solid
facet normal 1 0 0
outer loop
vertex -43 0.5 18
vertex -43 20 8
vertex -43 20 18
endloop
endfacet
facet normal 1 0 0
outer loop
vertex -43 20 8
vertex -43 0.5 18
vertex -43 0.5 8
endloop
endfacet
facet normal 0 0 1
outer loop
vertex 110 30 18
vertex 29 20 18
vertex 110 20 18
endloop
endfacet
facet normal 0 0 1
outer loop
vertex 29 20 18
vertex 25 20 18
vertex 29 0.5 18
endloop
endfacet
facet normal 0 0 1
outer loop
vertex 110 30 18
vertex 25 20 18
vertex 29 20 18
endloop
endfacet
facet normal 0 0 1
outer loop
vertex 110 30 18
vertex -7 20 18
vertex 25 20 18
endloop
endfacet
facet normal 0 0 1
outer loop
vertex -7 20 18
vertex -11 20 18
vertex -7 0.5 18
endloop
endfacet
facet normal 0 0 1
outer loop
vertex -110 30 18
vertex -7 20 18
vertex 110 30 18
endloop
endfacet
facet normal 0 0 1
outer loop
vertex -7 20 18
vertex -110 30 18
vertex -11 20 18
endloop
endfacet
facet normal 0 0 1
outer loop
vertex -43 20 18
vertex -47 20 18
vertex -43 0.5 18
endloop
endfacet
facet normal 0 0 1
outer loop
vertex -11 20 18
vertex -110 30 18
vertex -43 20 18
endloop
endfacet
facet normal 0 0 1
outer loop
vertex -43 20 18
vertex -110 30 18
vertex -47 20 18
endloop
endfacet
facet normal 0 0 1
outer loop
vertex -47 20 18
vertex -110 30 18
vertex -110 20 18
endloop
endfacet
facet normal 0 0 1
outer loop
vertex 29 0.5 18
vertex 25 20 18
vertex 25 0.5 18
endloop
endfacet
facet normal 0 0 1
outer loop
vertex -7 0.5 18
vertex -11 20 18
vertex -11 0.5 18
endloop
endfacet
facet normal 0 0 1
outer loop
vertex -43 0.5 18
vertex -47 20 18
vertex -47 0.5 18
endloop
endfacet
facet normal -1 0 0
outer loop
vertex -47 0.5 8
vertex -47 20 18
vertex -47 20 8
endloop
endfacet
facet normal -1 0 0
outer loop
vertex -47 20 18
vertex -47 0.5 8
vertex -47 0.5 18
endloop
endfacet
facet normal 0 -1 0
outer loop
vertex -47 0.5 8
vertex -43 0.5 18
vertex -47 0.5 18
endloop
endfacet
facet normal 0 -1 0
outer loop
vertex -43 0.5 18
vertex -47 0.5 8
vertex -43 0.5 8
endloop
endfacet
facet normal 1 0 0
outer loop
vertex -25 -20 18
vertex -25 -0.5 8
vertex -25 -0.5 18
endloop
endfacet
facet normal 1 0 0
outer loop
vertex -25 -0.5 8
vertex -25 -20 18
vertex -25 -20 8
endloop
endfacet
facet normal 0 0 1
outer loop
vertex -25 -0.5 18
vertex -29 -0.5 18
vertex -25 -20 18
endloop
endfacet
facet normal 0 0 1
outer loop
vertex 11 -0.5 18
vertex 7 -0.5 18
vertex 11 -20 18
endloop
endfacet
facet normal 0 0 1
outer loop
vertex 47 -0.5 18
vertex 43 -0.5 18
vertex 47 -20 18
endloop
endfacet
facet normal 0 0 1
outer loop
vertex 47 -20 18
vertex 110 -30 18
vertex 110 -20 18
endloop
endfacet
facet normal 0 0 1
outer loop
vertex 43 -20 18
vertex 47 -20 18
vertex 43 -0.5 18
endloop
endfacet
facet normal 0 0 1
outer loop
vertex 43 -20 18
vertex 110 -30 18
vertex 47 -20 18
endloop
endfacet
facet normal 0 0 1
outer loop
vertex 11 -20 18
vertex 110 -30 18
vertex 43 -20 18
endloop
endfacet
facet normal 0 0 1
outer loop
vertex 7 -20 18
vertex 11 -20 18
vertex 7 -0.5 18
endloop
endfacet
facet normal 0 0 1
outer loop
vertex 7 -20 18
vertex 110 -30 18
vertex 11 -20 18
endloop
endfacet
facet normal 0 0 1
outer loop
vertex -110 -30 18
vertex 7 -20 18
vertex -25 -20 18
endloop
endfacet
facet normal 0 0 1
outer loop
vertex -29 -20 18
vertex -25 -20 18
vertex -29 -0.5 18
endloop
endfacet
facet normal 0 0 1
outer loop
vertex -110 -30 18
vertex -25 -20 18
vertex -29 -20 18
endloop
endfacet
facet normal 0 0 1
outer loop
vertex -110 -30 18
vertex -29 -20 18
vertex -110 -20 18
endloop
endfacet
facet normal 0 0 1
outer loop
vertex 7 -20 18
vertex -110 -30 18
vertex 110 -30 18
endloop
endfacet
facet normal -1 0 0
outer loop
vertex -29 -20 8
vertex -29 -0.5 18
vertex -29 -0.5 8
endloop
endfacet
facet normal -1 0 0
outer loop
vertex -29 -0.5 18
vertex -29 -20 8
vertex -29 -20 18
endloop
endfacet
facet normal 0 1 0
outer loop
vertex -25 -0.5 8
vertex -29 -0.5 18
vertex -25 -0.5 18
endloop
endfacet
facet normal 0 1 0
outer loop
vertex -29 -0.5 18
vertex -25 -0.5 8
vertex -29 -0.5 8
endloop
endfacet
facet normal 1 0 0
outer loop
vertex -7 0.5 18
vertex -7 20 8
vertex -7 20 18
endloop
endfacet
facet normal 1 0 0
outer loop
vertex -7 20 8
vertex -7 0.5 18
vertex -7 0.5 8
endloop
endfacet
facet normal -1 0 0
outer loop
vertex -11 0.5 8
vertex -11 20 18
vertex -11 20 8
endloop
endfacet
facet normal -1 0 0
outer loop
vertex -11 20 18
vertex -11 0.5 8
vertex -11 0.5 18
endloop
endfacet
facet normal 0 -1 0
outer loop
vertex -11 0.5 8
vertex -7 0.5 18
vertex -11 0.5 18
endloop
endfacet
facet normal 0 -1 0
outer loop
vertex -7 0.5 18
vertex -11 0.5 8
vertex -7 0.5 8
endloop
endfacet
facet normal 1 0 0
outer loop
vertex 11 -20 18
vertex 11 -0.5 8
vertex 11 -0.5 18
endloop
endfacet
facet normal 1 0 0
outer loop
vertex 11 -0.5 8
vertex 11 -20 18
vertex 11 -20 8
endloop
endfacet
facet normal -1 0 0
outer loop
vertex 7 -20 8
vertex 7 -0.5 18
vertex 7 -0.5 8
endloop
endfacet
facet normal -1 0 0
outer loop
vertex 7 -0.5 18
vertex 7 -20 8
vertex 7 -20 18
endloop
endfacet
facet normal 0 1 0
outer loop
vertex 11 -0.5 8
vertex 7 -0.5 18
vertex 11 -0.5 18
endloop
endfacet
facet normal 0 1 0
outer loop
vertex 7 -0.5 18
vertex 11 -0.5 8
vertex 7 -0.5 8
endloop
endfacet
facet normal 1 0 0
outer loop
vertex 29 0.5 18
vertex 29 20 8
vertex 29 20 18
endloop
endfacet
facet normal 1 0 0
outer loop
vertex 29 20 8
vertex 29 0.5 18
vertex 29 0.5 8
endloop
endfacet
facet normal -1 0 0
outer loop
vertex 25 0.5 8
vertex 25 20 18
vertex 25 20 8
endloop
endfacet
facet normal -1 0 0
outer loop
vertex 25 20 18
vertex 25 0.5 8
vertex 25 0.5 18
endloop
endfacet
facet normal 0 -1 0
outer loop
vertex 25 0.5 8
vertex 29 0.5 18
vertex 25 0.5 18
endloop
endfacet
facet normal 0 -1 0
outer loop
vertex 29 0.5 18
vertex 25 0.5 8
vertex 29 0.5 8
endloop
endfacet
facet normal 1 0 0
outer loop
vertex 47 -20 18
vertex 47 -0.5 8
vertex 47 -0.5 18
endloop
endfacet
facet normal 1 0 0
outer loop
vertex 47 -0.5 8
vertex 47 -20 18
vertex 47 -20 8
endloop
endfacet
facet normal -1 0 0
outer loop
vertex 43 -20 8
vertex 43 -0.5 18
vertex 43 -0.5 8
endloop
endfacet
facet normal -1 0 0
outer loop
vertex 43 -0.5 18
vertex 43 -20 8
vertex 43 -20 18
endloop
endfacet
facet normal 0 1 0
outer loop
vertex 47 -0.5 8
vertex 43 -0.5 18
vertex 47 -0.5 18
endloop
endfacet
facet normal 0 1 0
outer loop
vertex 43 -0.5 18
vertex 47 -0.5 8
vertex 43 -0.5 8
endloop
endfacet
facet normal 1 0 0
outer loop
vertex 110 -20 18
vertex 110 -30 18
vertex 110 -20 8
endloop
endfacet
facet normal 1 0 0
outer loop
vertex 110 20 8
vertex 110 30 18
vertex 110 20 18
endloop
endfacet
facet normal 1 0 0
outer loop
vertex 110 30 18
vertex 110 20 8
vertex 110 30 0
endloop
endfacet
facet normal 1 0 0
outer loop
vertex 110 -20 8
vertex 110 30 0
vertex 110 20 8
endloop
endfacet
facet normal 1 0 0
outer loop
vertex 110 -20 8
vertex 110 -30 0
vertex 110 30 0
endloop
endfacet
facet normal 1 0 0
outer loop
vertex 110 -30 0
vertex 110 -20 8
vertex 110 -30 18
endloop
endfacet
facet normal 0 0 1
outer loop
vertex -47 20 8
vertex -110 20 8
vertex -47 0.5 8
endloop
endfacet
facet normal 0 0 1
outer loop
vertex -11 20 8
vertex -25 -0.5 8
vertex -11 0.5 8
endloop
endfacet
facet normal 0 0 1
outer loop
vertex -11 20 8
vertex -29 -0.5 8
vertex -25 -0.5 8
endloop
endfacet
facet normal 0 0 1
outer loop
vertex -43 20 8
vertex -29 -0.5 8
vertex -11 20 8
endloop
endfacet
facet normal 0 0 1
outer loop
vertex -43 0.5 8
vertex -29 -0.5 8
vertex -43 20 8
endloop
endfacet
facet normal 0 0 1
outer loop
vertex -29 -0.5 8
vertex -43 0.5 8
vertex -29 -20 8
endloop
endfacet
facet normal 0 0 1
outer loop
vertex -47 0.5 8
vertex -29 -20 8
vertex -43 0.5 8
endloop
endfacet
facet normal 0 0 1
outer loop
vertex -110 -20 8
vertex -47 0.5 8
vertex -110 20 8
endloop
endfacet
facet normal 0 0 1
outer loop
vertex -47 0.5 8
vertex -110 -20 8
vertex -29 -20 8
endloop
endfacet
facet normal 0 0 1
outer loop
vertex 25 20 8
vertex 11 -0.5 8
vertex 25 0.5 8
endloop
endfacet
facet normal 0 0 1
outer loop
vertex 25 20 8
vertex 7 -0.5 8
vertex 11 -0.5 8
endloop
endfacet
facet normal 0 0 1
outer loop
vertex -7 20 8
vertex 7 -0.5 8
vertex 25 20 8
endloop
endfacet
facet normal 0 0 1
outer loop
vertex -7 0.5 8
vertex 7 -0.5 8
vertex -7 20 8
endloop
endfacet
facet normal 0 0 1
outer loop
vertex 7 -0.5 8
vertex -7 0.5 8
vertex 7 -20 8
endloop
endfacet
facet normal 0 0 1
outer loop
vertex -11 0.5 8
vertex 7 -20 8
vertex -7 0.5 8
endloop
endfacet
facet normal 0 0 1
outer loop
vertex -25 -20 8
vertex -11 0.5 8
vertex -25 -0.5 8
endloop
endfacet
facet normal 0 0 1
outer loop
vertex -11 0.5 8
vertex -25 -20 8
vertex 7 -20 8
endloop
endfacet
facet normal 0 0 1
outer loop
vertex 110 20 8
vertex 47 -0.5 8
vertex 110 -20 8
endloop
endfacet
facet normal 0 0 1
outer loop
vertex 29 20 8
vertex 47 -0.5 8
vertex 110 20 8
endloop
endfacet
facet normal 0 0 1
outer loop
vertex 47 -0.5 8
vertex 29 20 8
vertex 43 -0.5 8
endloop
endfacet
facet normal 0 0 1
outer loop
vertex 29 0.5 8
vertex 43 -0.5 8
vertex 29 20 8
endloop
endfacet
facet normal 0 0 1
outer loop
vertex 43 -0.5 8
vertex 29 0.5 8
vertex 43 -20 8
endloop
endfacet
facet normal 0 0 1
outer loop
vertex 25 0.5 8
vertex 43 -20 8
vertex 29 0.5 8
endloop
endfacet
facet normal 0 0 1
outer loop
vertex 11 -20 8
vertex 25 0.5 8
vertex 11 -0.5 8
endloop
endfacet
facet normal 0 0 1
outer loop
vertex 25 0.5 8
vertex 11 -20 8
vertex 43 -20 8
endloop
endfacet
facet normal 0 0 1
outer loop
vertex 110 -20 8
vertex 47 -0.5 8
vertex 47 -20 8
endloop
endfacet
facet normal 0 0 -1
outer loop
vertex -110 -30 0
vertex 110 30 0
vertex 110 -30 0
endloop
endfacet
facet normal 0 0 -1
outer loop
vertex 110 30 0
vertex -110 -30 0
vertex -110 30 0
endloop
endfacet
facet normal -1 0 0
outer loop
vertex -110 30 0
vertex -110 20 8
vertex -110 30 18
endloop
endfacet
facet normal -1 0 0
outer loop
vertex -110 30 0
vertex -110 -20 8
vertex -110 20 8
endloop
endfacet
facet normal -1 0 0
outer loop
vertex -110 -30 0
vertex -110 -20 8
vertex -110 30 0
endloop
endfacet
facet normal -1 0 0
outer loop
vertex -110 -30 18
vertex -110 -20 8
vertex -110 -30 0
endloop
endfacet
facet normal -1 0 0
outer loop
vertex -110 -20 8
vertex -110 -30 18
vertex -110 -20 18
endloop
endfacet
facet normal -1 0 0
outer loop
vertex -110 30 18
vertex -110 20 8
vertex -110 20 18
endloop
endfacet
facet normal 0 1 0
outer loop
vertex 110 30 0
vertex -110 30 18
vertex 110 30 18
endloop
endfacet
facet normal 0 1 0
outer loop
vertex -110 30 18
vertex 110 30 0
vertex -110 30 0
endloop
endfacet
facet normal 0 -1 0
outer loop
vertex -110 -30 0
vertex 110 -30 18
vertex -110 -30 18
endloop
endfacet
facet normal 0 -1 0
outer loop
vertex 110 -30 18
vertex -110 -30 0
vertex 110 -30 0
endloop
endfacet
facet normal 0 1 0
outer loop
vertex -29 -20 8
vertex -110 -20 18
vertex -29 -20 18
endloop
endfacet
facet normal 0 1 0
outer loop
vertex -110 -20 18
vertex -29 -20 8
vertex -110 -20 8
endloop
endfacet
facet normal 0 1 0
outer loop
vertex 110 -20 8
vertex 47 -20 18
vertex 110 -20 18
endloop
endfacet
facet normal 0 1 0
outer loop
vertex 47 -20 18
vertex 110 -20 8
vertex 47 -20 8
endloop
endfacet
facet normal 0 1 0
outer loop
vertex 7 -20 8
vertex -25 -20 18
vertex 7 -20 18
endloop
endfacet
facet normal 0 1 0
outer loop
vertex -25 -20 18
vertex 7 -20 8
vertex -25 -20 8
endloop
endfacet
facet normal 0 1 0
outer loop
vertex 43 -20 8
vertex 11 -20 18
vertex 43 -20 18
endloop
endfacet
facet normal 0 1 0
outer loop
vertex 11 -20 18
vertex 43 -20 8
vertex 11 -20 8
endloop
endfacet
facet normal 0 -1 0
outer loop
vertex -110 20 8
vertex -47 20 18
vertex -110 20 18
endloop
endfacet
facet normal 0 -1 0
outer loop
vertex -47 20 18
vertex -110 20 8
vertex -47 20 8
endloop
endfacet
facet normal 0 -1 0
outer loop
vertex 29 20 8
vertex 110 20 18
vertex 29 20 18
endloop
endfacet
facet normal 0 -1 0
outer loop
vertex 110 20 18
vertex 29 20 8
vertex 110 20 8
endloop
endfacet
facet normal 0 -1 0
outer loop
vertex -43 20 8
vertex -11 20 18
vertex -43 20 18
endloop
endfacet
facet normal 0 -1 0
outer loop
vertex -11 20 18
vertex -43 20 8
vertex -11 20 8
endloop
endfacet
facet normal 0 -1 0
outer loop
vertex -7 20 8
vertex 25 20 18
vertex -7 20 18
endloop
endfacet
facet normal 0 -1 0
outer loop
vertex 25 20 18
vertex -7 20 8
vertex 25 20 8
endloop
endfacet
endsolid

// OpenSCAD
$fn = 32;

// ----------------------------------------------------------------------
// Rib frame 220 x 60 x 18
// 6 ribs at 18 mm pitch, staggered
// ----------------------------------------------------------------------

// --- parameters (mm) ---
frame = [220, 60, 8];  // base plate size (x, y, z)
rail_w = 10;           // side rail width
ribs = 6;              // number of ribs
rib_t = 4;             // rib thickness
rib_h = 10;            // rib height above the base plate
pitch = 18;            // pitch between rib centres

// --- derived feature positions (mm) ---
span = (ribs - 1) * pitch;          // = 90   distance between the outer ribs
origin_x = -span / 2;               // = -45   X of the first rib
rib_len = frame[1] / 2 - rail_w + 0.5;  // = 20.5   length of a staggered rib
rib_y = 0.5 + rib_len / 2;          // = 10.75   Y of a staggered rib centre
row_offset = 2 * rib_y;             // = 21.5   distance between the two rows
feature_centers = [
  [origin_x + 0 * pitch, rib_y],
  [origin_x + 1 * pitch, -rib_y],
  [origin_x + 2 * pitch, rib_y],
  [origin_x + 3 * pitch, -rib_y],
  [origin_x + 4 * pitch, rib_y],
  [origin_x + 5 * pitch, -rib_y]
];   // rib centre line, drives the rib loop

// base plate, two side rails, then the ribs read straight off feature_centers
union() {
  translate([-frame[0] / 2, -frame[1] / 2, 0]) cube(frame);
  translate([-frame[0] / 2, -frame[1] / 2, 0]) cube([frame[0], rail_w, frame[2] + rib_h]);
  translate([-frame[0] / 2, frame[1] / 2 - rail_w, 0]) cube([frame[0], rail_w, frame[2] + rib_h]);
  for (centre = feature_centers)
    translate([centre[0] - rib_t / 2, centre[1] - rib_len / 2, frame[2] - 1])
      cube([rib_t, rib_len, rib_h + 1]);
}
